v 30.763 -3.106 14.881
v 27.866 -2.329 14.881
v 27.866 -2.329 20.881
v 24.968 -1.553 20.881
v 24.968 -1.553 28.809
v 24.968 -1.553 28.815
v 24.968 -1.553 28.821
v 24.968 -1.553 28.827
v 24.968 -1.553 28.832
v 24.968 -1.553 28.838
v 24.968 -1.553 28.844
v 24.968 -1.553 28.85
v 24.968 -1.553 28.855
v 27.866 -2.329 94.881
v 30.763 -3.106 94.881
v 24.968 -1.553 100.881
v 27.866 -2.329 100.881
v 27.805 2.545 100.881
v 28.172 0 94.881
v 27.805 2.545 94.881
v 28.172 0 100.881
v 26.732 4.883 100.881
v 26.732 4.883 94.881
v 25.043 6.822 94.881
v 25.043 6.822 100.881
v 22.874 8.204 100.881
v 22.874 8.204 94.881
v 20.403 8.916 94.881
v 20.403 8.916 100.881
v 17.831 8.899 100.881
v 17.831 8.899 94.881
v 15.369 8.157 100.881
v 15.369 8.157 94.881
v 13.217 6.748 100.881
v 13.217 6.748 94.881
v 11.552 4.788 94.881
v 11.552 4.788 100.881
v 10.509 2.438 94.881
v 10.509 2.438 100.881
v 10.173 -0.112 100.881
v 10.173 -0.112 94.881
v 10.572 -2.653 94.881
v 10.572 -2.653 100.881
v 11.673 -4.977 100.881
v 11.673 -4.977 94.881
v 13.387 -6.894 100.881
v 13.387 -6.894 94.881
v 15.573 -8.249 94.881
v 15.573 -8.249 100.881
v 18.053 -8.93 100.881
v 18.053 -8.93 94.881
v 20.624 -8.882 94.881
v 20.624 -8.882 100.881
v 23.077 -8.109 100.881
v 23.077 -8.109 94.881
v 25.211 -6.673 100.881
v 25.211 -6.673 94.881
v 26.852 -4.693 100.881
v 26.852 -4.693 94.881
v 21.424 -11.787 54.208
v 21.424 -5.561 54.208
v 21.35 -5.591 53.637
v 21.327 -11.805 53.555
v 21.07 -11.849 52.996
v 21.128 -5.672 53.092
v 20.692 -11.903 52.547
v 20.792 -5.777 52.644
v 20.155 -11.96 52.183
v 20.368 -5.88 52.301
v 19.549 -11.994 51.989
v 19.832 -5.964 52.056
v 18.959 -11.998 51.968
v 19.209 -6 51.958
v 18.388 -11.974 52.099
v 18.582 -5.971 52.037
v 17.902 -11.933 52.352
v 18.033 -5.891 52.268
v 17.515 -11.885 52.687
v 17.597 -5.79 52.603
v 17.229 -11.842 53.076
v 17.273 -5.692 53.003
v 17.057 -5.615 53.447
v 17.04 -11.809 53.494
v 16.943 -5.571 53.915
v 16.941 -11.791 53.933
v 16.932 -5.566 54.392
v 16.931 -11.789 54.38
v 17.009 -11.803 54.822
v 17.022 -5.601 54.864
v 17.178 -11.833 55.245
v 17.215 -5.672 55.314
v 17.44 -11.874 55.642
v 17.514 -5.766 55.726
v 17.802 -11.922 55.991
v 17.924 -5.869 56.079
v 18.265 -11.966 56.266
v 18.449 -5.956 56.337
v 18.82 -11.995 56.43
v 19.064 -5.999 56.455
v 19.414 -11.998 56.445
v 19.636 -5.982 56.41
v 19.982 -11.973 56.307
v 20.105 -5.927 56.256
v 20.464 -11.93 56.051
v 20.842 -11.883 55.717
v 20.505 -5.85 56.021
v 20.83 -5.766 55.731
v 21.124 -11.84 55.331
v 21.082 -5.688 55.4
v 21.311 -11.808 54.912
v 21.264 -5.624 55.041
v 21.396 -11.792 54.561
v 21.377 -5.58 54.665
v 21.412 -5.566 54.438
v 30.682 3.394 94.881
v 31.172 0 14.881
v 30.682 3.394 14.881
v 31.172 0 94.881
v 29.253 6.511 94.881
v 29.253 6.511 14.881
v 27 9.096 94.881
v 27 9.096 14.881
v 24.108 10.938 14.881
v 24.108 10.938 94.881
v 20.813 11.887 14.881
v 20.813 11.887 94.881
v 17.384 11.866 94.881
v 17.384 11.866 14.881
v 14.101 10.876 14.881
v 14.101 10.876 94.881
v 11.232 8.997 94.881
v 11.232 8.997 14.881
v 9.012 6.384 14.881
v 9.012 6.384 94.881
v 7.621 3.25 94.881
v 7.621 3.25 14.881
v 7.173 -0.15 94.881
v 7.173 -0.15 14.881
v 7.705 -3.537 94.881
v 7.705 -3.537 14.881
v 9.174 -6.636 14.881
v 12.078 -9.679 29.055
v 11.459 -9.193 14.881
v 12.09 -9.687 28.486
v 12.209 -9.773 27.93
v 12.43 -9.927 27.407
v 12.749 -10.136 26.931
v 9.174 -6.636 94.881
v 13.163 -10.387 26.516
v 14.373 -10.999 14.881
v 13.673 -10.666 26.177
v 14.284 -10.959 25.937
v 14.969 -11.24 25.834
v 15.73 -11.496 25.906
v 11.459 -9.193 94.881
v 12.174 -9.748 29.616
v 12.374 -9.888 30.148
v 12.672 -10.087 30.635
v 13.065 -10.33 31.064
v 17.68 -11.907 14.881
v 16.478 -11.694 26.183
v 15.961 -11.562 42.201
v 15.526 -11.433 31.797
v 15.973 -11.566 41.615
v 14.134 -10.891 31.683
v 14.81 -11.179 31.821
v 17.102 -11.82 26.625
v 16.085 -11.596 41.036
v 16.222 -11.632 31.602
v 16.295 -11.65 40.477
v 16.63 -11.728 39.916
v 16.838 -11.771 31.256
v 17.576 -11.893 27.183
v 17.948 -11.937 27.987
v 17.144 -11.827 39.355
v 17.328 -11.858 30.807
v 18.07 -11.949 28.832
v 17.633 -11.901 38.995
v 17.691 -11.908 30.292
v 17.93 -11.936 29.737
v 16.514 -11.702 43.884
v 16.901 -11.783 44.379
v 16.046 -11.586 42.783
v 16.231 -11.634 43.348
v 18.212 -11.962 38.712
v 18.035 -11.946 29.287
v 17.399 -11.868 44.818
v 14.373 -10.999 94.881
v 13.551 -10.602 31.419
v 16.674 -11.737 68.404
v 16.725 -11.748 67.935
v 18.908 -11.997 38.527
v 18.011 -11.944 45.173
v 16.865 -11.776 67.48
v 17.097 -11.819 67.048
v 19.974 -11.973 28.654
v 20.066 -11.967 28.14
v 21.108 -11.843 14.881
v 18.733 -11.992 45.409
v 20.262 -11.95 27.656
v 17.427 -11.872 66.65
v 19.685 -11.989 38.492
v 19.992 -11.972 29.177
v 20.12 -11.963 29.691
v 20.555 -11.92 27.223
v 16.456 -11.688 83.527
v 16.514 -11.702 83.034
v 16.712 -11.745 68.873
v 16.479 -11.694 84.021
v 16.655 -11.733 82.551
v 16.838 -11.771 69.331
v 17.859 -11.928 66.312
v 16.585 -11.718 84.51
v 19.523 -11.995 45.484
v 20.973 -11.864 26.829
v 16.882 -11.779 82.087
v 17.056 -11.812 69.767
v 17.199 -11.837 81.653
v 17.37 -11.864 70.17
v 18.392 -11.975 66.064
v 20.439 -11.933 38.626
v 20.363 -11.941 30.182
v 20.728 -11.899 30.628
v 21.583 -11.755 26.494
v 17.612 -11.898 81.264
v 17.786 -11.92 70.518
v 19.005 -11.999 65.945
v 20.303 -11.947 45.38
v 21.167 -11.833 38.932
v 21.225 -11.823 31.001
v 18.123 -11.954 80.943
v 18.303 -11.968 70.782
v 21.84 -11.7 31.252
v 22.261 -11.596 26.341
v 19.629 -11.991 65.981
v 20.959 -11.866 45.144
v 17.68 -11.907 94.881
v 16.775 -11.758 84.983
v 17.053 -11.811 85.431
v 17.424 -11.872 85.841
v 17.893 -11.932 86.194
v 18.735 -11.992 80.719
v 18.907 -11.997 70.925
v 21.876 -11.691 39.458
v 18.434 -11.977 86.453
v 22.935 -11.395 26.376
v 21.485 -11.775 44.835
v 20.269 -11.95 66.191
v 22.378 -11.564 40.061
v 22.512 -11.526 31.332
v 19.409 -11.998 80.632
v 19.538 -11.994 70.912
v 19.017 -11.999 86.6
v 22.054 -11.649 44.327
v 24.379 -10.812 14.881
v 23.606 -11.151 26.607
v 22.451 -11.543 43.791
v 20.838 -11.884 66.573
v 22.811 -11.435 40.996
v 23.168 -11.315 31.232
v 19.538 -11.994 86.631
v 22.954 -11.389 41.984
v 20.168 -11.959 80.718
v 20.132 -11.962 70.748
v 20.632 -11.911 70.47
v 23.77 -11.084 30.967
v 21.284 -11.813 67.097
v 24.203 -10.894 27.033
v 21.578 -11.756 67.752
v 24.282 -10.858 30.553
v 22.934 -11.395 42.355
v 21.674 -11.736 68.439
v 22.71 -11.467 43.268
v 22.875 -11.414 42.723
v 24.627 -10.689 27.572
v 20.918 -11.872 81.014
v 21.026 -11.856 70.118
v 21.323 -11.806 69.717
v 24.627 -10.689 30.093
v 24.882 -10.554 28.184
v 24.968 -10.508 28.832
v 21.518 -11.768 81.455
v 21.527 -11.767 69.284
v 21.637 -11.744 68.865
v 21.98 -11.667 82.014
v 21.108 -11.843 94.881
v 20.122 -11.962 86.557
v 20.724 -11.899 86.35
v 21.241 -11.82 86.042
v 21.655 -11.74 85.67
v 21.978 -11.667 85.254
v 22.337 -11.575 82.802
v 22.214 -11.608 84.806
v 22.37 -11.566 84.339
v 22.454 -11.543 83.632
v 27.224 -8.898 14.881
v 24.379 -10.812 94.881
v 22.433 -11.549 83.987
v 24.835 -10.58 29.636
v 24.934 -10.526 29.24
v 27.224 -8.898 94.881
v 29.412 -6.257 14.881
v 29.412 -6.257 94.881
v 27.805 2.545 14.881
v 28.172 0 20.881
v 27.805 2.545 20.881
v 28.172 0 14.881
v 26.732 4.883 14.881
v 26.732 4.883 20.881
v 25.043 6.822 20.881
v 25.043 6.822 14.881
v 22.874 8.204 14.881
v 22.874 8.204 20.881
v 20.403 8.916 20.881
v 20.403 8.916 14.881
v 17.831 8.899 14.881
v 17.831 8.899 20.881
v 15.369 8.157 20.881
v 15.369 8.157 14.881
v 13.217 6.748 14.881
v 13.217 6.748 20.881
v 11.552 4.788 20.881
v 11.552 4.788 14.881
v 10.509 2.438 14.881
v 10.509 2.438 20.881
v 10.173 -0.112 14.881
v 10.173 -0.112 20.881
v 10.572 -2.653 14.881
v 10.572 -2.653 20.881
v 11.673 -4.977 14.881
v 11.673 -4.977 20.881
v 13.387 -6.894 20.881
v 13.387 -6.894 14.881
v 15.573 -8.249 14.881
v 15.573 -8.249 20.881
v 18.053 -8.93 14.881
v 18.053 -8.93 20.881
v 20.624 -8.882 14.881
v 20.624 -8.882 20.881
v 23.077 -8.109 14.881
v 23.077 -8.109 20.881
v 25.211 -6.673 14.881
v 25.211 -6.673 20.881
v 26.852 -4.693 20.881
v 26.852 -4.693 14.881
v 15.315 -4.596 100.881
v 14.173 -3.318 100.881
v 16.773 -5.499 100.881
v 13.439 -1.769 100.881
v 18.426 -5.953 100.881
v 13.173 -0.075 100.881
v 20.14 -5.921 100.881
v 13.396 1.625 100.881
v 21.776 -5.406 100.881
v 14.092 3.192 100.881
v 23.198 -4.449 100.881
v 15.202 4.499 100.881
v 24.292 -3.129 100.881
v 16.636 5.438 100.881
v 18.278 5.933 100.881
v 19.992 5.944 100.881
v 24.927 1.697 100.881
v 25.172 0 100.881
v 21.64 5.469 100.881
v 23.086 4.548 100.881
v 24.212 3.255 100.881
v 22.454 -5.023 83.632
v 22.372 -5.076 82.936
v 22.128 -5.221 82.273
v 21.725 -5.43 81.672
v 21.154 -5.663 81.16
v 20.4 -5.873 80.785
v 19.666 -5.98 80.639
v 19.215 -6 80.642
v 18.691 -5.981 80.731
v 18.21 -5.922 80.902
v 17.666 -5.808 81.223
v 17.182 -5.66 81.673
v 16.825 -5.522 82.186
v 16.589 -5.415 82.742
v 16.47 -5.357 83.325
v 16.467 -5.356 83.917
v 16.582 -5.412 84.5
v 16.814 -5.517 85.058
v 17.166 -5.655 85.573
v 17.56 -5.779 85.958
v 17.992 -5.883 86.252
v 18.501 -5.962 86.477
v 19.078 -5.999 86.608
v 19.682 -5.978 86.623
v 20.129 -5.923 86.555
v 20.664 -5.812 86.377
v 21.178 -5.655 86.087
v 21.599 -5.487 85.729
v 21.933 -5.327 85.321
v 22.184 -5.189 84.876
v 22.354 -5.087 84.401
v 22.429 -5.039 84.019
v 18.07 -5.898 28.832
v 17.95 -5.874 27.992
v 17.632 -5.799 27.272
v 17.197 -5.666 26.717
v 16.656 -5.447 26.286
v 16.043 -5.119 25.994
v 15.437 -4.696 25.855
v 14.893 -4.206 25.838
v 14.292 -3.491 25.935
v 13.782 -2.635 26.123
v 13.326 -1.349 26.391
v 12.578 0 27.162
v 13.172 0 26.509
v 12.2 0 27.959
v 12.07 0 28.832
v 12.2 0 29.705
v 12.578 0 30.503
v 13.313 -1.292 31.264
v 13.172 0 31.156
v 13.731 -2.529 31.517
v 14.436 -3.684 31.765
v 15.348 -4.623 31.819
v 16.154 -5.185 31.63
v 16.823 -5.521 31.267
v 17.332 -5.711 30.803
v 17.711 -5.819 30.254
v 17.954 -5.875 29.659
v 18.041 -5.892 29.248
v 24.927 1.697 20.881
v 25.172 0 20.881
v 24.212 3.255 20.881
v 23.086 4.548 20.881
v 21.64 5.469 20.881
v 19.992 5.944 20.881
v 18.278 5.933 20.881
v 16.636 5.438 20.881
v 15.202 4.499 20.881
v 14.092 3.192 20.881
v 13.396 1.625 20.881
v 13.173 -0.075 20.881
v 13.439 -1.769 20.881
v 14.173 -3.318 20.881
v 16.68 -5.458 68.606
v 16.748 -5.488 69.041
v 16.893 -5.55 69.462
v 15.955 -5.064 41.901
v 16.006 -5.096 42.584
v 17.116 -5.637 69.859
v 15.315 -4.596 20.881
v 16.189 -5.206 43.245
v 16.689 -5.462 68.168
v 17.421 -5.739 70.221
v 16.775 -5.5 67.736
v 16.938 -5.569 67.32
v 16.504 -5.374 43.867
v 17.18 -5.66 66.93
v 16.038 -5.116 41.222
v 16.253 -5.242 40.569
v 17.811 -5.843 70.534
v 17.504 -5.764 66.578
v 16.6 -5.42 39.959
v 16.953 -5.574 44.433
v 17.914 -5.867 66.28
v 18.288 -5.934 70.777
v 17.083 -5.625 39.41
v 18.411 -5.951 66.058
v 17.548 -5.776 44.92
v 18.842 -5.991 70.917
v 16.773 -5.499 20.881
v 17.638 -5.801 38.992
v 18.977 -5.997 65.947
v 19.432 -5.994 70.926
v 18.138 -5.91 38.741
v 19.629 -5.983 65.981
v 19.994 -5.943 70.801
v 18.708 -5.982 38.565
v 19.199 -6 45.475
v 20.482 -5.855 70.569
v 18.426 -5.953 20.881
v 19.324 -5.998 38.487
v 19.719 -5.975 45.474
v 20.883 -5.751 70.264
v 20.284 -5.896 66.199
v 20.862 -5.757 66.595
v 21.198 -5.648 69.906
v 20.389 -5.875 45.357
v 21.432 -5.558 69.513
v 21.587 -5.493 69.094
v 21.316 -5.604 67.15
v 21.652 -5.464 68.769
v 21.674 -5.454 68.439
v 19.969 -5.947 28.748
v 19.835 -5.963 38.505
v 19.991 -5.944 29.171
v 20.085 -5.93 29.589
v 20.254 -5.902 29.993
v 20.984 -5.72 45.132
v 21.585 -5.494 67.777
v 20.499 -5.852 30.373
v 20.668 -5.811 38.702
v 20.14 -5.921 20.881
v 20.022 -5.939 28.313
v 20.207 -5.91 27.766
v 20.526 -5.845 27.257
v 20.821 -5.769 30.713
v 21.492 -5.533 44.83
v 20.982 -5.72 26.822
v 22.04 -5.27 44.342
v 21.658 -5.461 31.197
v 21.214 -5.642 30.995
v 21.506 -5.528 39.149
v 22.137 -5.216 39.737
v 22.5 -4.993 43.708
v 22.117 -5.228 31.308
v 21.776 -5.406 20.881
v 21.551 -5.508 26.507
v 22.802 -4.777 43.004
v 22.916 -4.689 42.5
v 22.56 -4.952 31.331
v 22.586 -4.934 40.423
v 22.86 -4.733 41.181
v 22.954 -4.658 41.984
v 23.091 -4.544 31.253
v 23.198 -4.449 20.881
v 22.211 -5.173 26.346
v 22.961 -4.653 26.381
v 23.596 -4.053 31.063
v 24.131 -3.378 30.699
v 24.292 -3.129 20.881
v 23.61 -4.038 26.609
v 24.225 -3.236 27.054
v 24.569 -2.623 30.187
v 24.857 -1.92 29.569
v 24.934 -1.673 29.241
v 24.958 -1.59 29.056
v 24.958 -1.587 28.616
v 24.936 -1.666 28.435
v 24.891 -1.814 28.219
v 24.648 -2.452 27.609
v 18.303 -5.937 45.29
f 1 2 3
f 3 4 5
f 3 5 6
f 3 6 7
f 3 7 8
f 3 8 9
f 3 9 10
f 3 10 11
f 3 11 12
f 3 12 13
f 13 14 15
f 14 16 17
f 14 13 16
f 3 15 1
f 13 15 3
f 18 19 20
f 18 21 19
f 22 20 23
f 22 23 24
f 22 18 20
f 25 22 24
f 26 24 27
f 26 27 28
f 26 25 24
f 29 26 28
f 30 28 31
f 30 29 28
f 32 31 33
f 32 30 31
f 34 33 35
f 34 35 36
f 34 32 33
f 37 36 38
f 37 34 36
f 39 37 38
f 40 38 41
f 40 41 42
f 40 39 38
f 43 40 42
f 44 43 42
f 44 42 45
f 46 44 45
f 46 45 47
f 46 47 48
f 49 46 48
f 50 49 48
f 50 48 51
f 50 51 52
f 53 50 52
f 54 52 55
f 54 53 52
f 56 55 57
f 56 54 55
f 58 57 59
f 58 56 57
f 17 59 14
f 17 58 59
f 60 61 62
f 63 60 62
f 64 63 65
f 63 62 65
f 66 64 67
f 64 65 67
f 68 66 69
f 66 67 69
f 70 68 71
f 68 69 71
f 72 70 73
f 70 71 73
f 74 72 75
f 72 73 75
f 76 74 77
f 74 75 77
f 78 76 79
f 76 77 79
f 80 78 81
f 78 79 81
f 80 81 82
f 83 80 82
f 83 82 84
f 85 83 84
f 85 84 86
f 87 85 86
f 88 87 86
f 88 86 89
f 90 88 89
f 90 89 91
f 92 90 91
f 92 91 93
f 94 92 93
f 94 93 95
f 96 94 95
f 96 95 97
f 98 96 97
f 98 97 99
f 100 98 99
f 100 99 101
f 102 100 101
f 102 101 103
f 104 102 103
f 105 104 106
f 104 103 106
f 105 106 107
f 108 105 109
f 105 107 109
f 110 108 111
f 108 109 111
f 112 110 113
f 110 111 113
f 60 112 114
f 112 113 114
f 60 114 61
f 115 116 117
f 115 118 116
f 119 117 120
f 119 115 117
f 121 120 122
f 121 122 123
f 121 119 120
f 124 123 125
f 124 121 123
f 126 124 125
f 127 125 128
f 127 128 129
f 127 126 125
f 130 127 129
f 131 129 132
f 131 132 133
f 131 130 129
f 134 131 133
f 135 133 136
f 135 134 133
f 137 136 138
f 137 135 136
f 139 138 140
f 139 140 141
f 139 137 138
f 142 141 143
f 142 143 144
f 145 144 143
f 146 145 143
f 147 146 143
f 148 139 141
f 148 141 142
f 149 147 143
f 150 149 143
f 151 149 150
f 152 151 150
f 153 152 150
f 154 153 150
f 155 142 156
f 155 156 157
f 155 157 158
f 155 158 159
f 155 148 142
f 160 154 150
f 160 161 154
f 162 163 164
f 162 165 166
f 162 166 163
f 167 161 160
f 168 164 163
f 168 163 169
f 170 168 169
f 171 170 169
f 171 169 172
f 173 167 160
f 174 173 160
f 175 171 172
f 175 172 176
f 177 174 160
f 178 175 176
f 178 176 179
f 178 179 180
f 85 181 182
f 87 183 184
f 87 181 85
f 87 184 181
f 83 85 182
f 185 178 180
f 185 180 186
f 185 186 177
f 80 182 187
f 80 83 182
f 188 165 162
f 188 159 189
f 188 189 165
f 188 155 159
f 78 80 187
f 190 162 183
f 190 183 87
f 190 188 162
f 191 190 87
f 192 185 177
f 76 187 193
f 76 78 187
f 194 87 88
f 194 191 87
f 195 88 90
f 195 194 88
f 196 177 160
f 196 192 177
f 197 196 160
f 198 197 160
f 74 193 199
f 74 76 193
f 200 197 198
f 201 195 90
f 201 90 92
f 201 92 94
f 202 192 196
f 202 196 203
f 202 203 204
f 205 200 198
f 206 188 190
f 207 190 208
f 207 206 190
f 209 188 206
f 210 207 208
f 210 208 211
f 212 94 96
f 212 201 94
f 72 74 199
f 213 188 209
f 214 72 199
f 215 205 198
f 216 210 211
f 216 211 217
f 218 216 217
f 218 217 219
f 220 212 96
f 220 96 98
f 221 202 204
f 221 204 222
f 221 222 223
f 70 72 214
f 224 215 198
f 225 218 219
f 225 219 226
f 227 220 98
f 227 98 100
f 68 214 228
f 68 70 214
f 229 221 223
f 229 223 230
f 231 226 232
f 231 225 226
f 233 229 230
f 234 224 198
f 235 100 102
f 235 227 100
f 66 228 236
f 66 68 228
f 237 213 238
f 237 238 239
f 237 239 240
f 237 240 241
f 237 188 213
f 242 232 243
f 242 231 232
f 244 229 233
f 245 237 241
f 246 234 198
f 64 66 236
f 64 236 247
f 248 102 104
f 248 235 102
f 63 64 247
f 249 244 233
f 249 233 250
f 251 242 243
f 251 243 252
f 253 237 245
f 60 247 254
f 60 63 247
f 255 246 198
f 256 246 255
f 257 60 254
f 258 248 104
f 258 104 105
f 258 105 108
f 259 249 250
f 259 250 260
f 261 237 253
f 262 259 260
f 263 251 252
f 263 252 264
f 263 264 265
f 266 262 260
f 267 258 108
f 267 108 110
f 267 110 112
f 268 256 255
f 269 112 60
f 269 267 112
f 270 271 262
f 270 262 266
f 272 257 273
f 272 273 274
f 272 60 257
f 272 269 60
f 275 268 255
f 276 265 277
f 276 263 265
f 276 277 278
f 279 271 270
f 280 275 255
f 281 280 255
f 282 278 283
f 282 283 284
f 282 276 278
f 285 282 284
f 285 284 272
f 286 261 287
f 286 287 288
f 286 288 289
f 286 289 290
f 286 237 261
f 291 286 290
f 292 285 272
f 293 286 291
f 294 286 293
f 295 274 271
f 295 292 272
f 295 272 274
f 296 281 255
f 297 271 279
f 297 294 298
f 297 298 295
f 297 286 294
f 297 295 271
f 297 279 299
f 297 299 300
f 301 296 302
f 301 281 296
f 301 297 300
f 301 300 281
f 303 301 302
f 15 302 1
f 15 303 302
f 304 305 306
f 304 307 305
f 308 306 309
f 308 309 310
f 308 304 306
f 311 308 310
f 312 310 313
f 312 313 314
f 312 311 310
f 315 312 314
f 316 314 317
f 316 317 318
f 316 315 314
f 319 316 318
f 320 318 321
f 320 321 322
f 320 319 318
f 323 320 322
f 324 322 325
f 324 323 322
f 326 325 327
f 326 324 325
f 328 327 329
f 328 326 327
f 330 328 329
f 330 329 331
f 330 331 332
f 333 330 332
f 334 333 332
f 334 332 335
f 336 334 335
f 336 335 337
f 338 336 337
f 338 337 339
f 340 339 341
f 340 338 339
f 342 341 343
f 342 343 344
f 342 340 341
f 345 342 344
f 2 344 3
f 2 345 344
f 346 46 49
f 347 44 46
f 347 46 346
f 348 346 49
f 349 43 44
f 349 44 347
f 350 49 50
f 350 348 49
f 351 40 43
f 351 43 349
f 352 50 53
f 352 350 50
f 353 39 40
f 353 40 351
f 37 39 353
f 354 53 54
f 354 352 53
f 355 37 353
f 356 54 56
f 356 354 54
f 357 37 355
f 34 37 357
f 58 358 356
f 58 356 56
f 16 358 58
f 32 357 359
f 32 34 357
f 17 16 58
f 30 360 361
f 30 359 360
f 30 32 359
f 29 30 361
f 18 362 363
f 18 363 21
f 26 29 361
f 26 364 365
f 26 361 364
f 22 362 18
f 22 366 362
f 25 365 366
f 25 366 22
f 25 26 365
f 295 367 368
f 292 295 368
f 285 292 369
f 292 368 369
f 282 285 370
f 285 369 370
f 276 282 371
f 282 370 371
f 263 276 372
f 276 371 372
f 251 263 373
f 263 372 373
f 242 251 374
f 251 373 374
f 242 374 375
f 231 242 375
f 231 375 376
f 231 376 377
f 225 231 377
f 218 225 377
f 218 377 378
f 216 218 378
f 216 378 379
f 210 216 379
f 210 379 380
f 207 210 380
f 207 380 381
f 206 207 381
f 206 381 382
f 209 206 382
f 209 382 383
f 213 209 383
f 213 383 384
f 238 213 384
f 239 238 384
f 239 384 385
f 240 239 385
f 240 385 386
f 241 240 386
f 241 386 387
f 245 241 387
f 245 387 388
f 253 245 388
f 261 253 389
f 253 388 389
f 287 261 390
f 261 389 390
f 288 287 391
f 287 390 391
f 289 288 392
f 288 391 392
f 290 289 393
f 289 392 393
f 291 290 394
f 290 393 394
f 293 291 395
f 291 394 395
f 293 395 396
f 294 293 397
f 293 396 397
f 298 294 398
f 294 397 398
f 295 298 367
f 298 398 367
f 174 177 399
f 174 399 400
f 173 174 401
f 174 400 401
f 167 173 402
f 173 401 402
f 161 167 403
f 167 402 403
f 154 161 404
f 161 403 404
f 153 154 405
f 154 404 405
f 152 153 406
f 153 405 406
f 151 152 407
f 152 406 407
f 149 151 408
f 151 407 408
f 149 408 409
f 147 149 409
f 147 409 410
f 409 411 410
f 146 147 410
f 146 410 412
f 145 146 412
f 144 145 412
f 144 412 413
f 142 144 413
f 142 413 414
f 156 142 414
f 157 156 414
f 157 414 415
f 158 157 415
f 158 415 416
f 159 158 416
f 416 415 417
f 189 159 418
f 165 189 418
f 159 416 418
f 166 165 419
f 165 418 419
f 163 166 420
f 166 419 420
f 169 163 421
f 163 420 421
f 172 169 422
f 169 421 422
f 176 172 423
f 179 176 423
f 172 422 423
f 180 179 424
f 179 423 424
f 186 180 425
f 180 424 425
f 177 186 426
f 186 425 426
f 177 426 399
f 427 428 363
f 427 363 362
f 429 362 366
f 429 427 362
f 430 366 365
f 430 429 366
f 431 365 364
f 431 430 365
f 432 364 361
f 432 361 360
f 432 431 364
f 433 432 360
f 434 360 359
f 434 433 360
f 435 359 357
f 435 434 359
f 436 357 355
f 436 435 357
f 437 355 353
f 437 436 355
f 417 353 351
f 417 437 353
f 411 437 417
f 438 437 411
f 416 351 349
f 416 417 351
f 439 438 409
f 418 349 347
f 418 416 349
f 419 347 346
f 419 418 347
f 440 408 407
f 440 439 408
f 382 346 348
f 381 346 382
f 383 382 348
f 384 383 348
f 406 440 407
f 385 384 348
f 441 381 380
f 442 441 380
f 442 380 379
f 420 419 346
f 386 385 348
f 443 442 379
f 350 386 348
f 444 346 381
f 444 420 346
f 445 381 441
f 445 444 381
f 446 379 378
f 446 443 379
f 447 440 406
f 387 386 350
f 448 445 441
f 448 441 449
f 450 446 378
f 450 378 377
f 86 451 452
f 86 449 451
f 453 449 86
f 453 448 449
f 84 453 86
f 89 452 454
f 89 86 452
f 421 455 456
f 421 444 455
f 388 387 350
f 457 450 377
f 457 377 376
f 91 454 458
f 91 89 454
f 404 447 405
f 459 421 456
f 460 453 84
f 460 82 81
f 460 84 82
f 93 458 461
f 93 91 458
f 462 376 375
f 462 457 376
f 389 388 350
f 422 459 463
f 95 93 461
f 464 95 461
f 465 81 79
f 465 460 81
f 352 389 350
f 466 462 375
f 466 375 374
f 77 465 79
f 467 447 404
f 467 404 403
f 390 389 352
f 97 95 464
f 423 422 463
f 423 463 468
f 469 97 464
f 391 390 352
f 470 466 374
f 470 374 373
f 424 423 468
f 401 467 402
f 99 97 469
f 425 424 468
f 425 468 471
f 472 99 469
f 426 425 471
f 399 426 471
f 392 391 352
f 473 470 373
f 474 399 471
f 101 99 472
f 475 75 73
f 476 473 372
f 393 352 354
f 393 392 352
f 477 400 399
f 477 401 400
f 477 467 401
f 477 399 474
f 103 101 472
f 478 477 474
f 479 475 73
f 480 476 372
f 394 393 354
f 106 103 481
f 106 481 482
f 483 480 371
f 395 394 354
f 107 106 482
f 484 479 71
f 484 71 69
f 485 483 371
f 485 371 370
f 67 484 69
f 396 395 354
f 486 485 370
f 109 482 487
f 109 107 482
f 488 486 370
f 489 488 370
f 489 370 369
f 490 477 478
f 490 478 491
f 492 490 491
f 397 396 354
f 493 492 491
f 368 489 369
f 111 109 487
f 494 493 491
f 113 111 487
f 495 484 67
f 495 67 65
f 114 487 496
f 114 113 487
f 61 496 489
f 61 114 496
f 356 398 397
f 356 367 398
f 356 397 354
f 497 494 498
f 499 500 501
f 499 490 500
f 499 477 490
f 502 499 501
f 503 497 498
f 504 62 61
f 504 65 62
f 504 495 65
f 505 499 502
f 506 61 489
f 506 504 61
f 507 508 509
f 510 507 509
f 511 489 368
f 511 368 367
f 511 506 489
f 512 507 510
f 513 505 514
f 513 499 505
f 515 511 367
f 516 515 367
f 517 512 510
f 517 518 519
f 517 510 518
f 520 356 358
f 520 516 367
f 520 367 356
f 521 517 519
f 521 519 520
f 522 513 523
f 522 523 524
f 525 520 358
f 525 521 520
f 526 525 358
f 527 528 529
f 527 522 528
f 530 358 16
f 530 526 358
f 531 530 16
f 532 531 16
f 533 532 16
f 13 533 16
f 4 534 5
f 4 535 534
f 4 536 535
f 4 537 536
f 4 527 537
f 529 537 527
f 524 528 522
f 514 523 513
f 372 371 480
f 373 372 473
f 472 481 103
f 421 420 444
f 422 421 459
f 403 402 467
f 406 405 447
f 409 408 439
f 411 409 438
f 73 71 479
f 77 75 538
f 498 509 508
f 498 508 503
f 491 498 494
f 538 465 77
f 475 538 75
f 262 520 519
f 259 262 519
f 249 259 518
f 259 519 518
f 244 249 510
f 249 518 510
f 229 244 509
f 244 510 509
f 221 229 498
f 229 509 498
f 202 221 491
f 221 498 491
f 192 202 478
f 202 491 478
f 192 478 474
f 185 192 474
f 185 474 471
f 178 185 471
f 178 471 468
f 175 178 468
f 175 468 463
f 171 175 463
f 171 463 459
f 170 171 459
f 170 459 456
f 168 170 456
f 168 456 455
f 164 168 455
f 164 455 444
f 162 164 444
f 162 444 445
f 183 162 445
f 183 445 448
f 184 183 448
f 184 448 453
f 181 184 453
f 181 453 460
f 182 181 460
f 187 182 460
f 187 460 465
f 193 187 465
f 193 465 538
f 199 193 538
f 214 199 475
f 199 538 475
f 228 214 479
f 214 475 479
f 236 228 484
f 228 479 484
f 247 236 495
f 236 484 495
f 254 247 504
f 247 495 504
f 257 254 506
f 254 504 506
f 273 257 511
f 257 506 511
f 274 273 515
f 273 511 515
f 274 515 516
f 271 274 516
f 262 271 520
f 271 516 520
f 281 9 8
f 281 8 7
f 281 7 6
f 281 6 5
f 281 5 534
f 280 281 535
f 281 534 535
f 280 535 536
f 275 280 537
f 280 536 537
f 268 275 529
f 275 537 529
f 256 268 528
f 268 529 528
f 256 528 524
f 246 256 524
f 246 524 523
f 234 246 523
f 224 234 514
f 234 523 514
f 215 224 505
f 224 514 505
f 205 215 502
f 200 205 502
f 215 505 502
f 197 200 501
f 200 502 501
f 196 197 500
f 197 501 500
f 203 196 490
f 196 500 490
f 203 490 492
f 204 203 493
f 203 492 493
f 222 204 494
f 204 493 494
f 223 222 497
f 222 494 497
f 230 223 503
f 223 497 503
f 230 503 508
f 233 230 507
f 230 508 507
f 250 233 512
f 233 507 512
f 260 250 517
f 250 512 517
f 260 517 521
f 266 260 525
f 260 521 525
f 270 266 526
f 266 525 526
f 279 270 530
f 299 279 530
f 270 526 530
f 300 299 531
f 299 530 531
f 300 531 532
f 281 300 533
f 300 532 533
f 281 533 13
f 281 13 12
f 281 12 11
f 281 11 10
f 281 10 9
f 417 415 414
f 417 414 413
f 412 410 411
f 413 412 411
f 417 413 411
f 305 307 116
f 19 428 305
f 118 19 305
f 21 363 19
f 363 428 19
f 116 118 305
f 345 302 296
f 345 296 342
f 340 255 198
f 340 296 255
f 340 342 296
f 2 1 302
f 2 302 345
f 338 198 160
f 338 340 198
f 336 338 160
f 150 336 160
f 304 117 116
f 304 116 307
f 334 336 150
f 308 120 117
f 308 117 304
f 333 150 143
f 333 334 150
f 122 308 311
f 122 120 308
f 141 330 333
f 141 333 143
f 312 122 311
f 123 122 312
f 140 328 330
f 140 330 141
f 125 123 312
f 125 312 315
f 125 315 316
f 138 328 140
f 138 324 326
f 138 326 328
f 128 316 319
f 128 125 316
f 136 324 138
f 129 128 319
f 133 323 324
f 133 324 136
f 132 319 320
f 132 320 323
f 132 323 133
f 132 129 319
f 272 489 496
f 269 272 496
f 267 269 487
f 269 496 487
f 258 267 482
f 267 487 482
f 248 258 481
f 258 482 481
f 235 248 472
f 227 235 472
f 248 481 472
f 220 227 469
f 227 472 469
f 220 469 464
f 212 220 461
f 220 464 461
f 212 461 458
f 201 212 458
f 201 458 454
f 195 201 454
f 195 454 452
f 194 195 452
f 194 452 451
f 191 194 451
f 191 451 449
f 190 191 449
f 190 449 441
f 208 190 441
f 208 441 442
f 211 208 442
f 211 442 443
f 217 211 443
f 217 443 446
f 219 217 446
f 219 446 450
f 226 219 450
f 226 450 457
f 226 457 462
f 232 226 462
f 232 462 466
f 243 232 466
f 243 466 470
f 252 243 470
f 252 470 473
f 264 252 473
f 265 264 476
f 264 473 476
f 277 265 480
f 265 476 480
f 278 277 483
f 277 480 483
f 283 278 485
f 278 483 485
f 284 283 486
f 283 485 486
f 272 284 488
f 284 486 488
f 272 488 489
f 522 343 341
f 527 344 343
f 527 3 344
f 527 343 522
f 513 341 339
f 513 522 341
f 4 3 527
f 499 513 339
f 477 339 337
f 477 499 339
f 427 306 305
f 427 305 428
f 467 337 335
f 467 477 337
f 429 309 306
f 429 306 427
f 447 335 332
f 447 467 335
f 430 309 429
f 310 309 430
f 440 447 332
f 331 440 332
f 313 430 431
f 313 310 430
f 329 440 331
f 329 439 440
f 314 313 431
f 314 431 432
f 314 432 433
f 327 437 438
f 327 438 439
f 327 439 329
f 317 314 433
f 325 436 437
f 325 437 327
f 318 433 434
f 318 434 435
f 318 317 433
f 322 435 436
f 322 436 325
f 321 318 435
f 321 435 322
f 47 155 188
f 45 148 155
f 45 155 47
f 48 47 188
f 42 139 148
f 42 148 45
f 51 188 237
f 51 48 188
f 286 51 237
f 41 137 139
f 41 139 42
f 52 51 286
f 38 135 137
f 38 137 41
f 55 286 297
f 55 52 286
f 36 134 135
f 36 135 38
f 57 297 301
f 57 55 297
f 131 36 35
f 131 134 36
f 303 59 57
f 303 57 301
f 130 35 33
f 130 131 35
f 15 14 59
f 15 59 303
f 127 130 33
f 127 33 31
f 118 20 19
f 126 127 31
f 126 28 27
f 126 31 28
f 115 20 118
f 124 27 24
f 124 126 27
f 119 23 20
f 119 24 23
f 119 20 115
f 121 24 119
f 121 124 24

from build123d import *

# Parameters (mm, degrees)
F1_ANGLE  = 345
F8_D      = 6
F8_DEPTH  = 12.001
F9_D      = 5
F9_DEPTH  = 12.0010001
F10_D     = 4.5
F10_DEPTH = 12.0010001006
F11_D     = 7
F11_DEPTH = 12.0010001006
F12_D     = 6
F12_DEPTH = 12.001000103
F13_D     = 5
F13_DEPTH = 12.001000103


with BuildPart() as f1:
    # F0 (on Front) → F1 (revolve)
    with BuildSketch(Plane.XZ):
        Polygon((25.1722027957, 100.8808328976), (25.1722027957, 20.8808328976), (28.1722027957, 20.8808328976), (28.1722027957, 14.8808328976), (31.1722027957, 14.8808328976), (31.1722027957, 94.8808328976), (28.1722027957, 94.8808328976), (28.1722027957, 100.8808328976), align=None)
    revolve(axis=Axis((19.1722027957, 0, 37.7046503127), (0, 0, 1)), revolution_arc=F1_ANGLE)

    # F8 (through all, one way)
    with BuildSketch(Plane(origin=(0, 0, 0), x_dir=(1, 0, 0), z_dir=(0, 1, 0))):
        with Locations((19.4538831711, -83.6319848895)):
            Circle(F8_D / 2)
    extrude(amount=-F8_DEPTH, mode=Mode.SUBTRACT)

    # F9 (through all, one way)
    with BuildSketch(Plane(origin=(0, 0, 0), x_dir=(1, 0, 0), z_dir=(0, 1, 0))):
        with Locations((19.1739778966, -68.4388652444)):
            Circle(F9_D / 2)
    extrude(amount=-F9_DEPTH, mode=Mode.SUBTRACT)

    # F10 (through all, one way)
    with BuildSketch(Plane(origin=(0, 0, 0), x_dir=(1, 0, 0), z_dir=(0, 1, 0))):
        with Locations((19.1739778966, -54.2075932026)):
            Circle(F10_D / 2)
    extrude(amount=-F10_DEPTH, mode=Mode.SUBTRACT)

    # F11 (through all, one way)
    with BuildSketch(Plane(origin=(0, 0, 0), x_dir=(1, 0, 0), z_dir=(0, 1, 0))):
        with Locations((19.4538831711, -41.9842377305)):
            Circle(F11_D / 2)
    extrude(amount=-F11_DEPTH, mode=Mode.SUBTRACT)

    # F12 (through all, one way)
    with BuildSketch(Plane(origin=(0, 0, 0), x_dir=(1, 0, 0), z_dir=(0, 1, 0))):
        with Locations((15.0699084625, -28.8323182613)):
            Circle(F12_D / 2)
    extrude(amount=-F12_DEPTH, mode=Mode.SUBTRACT)

    # F13 (through all, one way)
    with BuildSketch(Plane(origin=(0, 0, 0), x_dir=(1, 0, 0), z_dir=(0, 1, 0))):
        with Locations((22.4678628147, -28.8323182613)):
            Circle(F13_D / 2)
    extrude(amount=-F13_DEPTH, mode=Mode.SUBTRACT)


solid = f1.part
